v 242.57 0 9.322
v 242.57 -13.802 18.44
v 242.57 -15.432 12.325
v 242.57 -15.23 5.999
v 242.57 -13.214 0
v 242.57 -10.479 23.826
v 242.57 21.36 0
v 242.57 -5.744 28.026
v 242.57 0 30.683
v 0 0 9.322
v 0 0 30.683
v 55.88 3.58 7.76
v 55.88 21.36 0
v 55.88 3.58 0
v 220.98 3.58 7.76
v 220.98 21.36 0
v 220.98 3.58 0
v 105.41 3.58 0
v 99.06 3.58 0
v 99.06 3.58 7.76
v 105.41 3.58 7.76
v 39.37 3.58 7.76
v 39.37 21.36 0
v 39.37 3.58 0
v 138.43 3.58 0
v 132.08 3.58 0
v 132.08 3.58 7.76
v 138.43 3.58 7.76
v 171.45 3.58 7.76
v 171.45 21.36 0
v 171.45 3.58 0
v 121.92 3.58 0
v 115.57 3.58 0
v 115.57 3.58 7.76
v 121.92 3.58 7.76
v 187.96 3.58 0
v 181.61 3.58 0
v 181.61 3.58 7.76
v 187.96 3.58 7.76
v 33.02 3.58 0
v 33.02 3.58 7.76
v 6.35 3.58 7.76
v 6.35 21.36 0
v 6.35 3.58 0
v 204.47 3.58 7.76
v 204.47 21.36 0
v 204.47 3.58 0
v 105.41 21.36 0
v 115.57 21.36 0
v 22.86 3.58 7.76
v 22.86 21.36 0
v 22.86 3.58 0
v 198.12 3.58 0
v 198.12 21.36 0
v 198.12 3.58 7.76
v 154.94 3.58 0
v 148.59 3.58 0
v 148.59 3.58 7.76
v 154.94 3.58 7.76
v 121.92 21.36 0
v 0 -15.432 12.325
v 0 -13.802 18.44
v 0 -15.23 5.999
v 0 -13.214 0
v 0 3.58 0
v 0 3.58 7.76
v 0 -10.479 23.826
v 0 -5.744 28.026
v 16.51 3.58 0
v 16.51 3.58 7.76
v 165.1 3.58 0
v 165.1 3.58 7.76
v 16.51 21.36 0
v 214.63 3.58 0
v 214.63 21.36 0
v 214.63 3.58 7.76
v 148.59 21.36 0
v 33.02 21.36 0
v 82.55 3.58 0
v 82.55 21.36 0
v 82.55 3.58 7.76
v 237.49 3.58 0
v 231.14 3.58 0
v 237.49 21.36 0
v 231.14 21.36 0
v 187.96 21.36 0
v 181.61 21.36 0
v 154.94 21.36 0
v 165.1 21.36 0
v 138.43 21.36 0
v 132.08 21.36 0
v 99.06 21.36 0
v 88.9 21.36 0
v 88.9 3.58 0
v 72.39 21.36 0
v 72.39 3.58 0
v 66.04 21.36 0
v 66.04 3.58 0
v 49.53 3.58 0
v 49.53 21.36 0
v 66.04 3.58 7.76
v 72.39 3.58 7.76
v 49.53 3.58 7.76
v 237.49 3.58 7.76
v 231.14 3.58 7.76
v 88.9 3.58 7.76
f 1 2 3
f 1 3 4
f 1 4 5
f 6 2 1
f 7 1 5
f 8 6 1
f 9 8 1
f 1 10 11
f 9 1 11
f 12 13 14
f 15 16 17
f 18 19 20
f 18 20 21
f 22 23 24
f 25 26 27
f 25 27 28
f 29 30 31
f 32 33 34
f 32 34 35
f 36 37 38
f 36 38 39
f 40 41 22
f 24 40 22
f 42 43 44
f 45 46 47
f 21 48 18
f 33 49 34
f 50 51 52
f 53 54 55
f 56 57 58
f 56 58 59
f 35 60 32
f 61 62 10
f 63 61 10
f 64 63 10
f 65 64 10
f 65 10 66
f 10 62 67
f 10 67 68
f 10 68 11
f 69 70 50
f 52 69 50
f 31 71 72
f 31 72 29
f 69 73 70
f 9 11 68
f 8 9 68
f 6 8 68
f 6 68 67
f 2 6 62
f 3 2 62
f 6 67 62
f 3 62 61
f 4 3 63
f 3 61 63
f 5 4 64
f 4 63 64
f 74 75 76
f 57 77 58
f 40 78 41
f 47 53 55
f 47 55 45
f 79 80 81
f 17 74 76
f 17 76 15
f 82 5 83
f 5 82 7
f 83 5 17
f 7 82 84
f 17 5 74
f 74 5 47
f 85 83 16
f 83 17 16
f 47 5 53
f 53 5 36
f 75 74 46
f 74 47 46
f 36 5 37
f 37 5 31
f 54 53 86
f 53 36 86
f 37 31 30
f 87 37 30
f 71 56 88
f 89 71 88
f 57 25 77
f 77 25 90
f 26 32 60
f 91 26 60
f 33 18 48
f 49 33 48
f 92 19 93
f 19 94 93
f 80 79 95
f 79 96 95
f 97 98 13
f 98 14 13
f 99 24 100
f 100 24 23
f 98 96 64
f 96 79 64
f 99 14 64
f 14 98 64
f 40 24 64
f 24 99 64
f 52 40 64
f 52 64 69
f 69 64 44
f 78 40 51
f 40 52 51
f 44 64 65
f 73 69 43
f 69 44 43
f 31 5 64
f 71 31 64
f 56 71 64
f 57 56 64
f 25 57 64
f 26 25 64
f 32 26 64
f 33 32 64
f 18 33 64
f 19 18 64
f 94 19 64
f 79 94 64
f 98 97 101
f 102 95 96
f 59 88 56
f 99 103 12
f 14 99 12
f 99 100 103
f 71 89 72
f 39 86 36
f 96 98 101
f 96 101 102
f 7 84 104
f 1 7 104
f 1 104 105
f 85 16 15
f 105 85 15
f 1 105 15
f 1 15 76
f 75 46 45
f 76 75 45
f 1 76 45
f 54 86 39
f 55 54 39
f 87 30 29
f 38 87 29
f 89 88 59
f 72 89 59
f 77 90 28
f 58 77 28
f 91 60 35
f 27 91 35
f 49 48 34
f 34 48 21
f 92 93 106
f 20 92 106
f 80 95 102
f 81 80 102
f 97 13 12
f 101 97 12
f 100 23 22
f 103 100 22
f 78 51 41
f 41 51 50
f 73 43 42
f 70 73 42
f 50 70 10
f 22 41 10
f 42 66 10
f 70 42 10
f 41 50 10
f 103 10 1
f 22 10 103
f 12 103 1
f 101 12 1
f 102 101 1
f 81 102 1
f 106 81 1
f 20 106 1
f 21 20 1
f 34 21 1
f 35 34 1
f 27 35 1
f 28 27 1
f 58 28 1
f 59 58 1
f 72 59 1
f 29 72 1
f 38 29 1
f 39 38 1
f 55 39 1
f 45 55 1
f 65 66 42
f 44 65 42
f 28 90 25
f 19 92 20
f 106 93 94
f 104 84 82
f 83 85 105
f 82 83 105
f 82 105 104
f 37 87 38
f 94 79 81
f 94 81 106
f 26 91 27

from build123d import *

# Parameters (mm, degrees)
F1_DEPTH = 242.57
F2_W     = 6.35
F2_H     = 17.78
F3_DEPTH = 30.683568


with BuildPart() as f1:
    # F0 (on Right) → F1 (new body)
    with BuildSketch(Plane.YZ):
        with BuildLine():
            Line((21.360137, 0), (0, 9.322432))
            Line((0, 9.322432), (0, 30.682568))
            ThreePointArc((0, 30.682568), (-13.802055, 18.43997), (-13.214322, 0))
            Line((-13.214322, 0), (21.360137, 0))
        make_face()
    extrude(amount=F1_DEPTH)

    # F2 (on face) → F3 (cut, through all)
    with BuildSketch(Plane(origin=(0, 0, 0), x_dir=(1, 0, 0), z_dir=(0, 0, -1))):
        with Locations((3.175, -12.470137)):
            Rectangle(F2_W, F2_H)
        with Locations((19.685, -12.470137)):
            Rectangle(F2_W, F2_H)
        with Locations((36.195, -12.470137)):
            Rectangle(F2_W, F2_H)
        with Locations((52.705, -12.470137)):
            Rectangle(F2_W, F2_H)
        with Locations((69.215, -12.470137)):
            Rectangle(F2_W, F2_H)
        with Locations((85.725, -12.470137)):
            Rectangle(F2_W, F2_H)
        with Locations((102.235, -12.470137)):
            Rectangle(F2_W, F2_H)
        with Locations((118.745, -12.470137)):
            Rectangle(F2_W, F2_H)
        with Locations((135.255, -12.470137)):
            Rectangle(F2_W, F2_H)
        with Locations((151.765, -12.470137)):
            Rectangle(F2_W, F2_H)
        with Locations((168.275, -12.470137)):
            Rectangle(F2_W, F2_H)
        with Locations((184.785, -12.470137)):
            Rectangle(F2_W, F2_H)
        with Locations((201.295, -12.470137)):
            Rectangle(F2_W, F2_H)
        with Locations((217.805, -12.470137)):
            Rectangle(F2_W, F2_H)
        with Locations((234.315, -12.470137)):
            Rectangle(F2_W, F2_H)
    extrude(amount=-F3_DEPTH, mode=Mode.SUBTRACT)


solid = f1.part
